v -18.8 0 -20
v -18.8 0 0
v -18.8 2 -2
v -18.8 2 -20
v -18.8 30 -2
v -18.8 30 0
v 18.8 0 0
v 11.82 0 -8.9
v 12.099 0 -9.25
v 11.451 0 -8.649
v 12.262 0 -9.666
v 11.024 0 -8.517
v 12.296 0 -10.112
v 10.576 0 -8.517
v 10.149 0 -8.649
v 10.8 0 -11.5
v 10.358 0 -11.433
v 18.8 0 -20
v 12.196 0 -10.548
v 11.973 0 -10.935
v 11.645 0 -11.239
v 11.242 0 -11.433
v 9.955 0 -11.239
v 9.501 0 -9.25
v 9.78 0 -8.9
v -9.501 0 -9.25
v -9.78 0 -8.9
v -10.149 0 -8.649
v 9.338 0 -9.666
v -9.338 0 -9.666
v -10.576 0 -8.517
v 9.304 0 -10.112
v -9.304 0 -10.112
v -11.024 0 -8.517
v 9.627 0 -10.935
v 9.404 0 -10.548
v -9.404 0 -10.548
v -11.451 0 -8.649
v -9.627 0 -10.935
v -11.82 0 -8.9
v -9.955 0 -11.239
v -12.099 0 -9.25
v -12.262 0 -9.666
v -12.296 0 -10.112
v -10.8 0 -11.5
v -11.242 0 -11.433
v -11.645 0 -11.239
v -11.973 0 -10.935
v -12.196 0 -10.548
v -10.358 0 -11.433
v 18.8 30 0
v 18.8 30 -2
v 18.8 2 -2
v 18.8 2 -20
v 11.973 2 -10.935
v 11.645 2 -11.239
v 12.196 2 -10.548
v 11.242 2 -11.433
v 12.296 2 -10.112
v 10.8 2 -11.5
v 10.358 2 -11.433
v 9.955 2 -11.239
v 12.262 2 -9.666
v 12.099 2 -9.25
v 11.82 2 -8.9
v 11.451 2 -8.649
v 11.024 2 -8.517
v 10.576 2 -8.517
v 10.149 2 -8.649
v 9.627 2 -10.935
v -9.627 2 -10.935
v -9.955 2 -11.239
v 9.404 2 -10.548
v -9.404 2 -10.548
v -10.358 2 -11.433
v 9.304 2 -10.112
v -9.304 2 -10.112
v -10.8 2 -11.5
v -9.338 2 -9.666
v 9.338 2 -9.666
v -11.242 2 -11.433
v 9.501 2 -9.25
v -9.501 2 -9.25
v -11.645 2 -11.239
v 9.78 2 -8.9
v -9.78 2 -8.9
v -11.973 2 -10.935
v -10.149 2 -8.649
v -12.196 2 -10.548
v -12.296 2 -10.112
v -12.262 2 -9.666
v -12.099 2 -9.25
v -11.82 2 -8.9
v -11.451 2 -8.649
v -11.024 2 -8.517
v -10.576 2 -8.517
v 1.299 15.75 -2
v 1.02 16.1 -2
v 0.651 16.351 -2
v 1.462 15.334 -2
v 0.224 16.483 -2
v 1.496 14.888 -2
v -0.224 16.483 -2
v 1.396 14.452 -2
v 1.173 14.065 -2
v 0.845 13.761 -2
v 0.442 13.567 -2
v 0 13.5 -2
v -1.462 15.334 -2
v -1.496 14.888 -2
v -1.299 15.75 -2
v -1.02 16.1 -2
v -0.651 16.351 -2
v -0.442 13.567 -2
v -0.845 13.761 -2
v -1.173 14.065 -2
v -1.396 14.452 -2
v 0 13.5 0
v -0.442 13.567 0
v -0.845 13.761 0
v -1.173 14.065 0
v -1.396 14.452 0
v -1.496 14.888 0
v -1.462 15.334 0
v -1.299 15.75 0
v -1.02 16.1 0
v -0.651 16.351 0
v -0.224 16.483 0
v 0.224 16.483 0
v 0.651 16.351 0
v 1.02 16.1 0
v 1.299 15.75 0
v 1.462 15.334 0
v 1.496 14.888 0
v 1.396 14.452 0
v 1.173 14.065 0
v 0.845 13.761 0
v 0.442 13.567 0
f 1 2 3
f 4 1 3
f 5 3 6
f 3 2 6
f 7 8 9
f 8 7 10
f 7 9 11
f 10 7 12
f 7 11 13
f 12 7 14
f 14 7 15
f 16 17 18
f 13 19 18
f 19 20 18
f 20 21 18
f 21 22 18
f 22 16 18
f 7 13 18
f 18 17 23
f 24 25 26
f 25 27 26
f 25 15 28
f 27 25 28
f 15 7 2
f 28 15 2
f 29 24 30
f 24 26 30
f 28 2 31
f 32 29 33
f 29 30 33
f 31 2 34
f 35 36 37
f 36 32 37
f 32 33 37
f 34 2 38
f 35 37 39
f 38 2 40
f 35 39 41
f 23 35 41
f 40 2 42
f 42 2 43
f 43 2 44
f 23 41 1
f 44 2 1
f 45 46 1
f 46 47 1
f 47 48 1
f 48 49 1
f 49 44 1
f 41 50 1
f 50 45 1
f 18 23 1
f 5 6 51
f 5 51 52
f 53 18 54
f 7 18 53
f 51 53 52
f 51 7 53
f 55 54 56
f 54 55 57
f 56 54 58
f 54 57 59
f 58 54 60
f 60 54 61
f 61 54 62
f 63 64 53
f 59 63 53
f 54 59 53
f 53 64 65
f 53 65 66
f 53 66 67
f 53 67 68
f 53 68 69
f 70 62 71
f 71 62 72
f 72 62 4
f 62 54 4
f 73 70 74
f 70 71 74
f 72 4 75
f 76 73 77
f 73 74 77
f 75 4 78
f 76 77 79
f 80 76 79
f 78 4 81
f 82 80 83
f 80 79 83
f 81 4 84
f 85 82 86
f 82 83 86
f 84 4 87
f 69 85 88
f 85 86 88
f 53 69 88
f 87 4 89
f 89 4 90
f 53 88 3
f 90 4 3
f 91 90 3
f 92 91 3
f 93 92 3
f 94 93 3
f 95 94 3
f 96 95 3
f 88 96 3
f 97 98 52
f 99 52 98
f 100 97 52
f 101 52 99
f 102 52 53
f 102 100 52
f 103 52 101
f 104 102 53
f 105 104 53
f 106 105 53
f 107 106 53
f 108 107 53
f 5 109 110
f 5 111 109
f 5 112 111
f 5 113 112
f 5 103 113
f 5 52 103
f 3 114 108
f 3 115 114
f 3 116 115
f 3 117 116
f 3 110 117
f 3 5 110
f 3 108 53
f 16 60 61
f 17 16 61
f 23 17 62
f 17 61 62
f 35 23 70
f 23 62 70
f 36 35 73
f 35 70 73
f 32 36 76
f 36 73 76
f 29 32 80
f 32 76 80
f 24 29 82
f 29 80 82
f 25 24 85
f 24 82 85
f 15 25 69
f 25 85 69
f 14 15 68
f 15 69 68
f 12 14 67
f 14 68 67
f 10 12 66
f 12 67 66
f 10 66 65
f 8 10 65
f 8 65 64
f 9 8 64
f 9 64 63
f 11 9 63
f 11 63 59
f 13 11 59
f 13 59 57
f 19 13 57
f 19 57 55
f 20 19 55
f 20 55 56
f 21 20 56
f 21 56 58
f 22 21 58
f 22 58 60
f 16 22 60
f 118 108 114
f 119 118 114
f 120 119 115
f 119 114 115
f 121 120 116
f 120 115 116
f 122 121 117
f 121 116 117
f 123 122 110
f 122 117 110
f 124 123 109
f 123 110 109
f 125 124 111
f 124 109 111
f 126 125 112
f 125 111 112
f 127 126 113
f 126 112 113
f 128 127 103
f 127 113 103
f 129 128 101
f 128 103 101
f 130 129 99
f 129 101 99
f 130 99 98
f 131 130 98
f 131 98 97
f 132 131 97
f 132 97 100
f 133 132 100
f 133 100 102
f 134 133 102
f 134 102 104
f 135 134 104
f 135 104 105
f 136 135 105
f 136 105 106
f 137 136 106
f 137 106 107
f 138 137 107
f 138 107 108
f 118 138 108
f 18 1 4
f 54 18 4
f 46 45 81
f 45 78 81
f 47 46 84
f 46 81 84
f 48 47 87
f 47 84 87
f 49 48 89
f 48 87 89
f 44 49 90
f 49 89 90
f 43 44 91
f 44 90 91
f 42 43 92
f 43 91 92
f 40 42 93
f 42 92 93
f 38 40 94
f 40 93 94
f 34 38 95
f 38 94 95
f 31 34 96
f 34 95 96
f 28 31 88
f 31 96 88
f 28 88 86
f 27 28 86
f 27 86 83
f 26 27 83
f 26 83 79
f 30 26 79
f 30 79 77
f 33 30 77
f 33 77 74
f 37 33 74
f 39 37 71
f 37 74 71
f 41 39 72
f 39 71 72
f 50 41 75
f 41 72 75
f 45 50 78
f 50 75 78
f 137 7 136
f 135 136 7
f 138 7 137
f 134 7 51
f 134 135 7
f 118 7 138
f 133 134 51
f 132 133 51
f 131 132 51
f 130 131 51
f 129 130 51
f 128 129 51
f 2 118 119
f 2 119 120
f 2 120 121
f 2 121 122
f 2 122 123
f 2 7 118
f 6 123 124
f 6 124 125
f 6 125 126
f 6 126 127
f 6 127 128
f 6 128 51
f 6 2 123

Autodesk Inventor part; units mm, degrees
ref_plane "YZ Plane" through (0, 0, 0) normal (1, 0, 0) x (0, 1, 0)
ref_plane "XZ Plane" through (0, 0, 0) normal (0, 1, 0) x (-1, 0, 0)
ref_plane "XY Plane" through (0, 0, 0) normal (0, 0, 1) x (1, 0, 0)
sketch "Szkic1" plane through (0, 0, 0) normal (1, 0, 0) x (0, 1, 0)
  line L0 (2, 0) -> (30, 0)
  line L1 (30, 0) -> (30, -2)
  line L2 (30, -2) -> (2, -2)
  line L3 (2, 0) -> (0, 0)
  line L4 (0, 0) -> (0, -20)
  line L5 (0, -20) -> (2, -20)
  line L6 (2, -20) -> (2, -2)
  dimension "d2" = 2
  dimension "d7" = 30
  dimension "d8" = 20
  dimension "d9" = 2
extrude "Wyciągnięcie proste1" add sketch "Szkic1" along normal mid plane 37.6
sketch "Szkic2" plane through (-18.8, 0, 0) normal (0, 0, 1) x (1, 0, 0)
  line L0 (18.8, 0) -> (18.8, 15) construction
  dimension "d12" = 15
hole "Otwór1" at (0, 15, 0) direction (0, 0, -1) diameter 3 end through all
sketch "Szkic3" plane through (-18.8, 0, -20) normal (0, -1, 0) x (1, 0, 0)
  line L0 (0, 0) -> (0, 20) projected
  line L1 (37.6, 20) -> (37.6, 0) projected
  line L2 (0, 10) -> (8, 10) construction
  line L3 (37.6, 10) -> (29.6, 10) construction
  point P0 (18.8, 20)
  dimension "d20" = 8
  dimension "d21" = 8
hole "Otwór2" at (-10.8, 0, -10) at (10.8, 0, -10) direction (0, 1, 0) diameter 3 end through all
properties part number "bepf_podwozie_lacznik_glownego_wspornika" material "Aluminium 6061"
